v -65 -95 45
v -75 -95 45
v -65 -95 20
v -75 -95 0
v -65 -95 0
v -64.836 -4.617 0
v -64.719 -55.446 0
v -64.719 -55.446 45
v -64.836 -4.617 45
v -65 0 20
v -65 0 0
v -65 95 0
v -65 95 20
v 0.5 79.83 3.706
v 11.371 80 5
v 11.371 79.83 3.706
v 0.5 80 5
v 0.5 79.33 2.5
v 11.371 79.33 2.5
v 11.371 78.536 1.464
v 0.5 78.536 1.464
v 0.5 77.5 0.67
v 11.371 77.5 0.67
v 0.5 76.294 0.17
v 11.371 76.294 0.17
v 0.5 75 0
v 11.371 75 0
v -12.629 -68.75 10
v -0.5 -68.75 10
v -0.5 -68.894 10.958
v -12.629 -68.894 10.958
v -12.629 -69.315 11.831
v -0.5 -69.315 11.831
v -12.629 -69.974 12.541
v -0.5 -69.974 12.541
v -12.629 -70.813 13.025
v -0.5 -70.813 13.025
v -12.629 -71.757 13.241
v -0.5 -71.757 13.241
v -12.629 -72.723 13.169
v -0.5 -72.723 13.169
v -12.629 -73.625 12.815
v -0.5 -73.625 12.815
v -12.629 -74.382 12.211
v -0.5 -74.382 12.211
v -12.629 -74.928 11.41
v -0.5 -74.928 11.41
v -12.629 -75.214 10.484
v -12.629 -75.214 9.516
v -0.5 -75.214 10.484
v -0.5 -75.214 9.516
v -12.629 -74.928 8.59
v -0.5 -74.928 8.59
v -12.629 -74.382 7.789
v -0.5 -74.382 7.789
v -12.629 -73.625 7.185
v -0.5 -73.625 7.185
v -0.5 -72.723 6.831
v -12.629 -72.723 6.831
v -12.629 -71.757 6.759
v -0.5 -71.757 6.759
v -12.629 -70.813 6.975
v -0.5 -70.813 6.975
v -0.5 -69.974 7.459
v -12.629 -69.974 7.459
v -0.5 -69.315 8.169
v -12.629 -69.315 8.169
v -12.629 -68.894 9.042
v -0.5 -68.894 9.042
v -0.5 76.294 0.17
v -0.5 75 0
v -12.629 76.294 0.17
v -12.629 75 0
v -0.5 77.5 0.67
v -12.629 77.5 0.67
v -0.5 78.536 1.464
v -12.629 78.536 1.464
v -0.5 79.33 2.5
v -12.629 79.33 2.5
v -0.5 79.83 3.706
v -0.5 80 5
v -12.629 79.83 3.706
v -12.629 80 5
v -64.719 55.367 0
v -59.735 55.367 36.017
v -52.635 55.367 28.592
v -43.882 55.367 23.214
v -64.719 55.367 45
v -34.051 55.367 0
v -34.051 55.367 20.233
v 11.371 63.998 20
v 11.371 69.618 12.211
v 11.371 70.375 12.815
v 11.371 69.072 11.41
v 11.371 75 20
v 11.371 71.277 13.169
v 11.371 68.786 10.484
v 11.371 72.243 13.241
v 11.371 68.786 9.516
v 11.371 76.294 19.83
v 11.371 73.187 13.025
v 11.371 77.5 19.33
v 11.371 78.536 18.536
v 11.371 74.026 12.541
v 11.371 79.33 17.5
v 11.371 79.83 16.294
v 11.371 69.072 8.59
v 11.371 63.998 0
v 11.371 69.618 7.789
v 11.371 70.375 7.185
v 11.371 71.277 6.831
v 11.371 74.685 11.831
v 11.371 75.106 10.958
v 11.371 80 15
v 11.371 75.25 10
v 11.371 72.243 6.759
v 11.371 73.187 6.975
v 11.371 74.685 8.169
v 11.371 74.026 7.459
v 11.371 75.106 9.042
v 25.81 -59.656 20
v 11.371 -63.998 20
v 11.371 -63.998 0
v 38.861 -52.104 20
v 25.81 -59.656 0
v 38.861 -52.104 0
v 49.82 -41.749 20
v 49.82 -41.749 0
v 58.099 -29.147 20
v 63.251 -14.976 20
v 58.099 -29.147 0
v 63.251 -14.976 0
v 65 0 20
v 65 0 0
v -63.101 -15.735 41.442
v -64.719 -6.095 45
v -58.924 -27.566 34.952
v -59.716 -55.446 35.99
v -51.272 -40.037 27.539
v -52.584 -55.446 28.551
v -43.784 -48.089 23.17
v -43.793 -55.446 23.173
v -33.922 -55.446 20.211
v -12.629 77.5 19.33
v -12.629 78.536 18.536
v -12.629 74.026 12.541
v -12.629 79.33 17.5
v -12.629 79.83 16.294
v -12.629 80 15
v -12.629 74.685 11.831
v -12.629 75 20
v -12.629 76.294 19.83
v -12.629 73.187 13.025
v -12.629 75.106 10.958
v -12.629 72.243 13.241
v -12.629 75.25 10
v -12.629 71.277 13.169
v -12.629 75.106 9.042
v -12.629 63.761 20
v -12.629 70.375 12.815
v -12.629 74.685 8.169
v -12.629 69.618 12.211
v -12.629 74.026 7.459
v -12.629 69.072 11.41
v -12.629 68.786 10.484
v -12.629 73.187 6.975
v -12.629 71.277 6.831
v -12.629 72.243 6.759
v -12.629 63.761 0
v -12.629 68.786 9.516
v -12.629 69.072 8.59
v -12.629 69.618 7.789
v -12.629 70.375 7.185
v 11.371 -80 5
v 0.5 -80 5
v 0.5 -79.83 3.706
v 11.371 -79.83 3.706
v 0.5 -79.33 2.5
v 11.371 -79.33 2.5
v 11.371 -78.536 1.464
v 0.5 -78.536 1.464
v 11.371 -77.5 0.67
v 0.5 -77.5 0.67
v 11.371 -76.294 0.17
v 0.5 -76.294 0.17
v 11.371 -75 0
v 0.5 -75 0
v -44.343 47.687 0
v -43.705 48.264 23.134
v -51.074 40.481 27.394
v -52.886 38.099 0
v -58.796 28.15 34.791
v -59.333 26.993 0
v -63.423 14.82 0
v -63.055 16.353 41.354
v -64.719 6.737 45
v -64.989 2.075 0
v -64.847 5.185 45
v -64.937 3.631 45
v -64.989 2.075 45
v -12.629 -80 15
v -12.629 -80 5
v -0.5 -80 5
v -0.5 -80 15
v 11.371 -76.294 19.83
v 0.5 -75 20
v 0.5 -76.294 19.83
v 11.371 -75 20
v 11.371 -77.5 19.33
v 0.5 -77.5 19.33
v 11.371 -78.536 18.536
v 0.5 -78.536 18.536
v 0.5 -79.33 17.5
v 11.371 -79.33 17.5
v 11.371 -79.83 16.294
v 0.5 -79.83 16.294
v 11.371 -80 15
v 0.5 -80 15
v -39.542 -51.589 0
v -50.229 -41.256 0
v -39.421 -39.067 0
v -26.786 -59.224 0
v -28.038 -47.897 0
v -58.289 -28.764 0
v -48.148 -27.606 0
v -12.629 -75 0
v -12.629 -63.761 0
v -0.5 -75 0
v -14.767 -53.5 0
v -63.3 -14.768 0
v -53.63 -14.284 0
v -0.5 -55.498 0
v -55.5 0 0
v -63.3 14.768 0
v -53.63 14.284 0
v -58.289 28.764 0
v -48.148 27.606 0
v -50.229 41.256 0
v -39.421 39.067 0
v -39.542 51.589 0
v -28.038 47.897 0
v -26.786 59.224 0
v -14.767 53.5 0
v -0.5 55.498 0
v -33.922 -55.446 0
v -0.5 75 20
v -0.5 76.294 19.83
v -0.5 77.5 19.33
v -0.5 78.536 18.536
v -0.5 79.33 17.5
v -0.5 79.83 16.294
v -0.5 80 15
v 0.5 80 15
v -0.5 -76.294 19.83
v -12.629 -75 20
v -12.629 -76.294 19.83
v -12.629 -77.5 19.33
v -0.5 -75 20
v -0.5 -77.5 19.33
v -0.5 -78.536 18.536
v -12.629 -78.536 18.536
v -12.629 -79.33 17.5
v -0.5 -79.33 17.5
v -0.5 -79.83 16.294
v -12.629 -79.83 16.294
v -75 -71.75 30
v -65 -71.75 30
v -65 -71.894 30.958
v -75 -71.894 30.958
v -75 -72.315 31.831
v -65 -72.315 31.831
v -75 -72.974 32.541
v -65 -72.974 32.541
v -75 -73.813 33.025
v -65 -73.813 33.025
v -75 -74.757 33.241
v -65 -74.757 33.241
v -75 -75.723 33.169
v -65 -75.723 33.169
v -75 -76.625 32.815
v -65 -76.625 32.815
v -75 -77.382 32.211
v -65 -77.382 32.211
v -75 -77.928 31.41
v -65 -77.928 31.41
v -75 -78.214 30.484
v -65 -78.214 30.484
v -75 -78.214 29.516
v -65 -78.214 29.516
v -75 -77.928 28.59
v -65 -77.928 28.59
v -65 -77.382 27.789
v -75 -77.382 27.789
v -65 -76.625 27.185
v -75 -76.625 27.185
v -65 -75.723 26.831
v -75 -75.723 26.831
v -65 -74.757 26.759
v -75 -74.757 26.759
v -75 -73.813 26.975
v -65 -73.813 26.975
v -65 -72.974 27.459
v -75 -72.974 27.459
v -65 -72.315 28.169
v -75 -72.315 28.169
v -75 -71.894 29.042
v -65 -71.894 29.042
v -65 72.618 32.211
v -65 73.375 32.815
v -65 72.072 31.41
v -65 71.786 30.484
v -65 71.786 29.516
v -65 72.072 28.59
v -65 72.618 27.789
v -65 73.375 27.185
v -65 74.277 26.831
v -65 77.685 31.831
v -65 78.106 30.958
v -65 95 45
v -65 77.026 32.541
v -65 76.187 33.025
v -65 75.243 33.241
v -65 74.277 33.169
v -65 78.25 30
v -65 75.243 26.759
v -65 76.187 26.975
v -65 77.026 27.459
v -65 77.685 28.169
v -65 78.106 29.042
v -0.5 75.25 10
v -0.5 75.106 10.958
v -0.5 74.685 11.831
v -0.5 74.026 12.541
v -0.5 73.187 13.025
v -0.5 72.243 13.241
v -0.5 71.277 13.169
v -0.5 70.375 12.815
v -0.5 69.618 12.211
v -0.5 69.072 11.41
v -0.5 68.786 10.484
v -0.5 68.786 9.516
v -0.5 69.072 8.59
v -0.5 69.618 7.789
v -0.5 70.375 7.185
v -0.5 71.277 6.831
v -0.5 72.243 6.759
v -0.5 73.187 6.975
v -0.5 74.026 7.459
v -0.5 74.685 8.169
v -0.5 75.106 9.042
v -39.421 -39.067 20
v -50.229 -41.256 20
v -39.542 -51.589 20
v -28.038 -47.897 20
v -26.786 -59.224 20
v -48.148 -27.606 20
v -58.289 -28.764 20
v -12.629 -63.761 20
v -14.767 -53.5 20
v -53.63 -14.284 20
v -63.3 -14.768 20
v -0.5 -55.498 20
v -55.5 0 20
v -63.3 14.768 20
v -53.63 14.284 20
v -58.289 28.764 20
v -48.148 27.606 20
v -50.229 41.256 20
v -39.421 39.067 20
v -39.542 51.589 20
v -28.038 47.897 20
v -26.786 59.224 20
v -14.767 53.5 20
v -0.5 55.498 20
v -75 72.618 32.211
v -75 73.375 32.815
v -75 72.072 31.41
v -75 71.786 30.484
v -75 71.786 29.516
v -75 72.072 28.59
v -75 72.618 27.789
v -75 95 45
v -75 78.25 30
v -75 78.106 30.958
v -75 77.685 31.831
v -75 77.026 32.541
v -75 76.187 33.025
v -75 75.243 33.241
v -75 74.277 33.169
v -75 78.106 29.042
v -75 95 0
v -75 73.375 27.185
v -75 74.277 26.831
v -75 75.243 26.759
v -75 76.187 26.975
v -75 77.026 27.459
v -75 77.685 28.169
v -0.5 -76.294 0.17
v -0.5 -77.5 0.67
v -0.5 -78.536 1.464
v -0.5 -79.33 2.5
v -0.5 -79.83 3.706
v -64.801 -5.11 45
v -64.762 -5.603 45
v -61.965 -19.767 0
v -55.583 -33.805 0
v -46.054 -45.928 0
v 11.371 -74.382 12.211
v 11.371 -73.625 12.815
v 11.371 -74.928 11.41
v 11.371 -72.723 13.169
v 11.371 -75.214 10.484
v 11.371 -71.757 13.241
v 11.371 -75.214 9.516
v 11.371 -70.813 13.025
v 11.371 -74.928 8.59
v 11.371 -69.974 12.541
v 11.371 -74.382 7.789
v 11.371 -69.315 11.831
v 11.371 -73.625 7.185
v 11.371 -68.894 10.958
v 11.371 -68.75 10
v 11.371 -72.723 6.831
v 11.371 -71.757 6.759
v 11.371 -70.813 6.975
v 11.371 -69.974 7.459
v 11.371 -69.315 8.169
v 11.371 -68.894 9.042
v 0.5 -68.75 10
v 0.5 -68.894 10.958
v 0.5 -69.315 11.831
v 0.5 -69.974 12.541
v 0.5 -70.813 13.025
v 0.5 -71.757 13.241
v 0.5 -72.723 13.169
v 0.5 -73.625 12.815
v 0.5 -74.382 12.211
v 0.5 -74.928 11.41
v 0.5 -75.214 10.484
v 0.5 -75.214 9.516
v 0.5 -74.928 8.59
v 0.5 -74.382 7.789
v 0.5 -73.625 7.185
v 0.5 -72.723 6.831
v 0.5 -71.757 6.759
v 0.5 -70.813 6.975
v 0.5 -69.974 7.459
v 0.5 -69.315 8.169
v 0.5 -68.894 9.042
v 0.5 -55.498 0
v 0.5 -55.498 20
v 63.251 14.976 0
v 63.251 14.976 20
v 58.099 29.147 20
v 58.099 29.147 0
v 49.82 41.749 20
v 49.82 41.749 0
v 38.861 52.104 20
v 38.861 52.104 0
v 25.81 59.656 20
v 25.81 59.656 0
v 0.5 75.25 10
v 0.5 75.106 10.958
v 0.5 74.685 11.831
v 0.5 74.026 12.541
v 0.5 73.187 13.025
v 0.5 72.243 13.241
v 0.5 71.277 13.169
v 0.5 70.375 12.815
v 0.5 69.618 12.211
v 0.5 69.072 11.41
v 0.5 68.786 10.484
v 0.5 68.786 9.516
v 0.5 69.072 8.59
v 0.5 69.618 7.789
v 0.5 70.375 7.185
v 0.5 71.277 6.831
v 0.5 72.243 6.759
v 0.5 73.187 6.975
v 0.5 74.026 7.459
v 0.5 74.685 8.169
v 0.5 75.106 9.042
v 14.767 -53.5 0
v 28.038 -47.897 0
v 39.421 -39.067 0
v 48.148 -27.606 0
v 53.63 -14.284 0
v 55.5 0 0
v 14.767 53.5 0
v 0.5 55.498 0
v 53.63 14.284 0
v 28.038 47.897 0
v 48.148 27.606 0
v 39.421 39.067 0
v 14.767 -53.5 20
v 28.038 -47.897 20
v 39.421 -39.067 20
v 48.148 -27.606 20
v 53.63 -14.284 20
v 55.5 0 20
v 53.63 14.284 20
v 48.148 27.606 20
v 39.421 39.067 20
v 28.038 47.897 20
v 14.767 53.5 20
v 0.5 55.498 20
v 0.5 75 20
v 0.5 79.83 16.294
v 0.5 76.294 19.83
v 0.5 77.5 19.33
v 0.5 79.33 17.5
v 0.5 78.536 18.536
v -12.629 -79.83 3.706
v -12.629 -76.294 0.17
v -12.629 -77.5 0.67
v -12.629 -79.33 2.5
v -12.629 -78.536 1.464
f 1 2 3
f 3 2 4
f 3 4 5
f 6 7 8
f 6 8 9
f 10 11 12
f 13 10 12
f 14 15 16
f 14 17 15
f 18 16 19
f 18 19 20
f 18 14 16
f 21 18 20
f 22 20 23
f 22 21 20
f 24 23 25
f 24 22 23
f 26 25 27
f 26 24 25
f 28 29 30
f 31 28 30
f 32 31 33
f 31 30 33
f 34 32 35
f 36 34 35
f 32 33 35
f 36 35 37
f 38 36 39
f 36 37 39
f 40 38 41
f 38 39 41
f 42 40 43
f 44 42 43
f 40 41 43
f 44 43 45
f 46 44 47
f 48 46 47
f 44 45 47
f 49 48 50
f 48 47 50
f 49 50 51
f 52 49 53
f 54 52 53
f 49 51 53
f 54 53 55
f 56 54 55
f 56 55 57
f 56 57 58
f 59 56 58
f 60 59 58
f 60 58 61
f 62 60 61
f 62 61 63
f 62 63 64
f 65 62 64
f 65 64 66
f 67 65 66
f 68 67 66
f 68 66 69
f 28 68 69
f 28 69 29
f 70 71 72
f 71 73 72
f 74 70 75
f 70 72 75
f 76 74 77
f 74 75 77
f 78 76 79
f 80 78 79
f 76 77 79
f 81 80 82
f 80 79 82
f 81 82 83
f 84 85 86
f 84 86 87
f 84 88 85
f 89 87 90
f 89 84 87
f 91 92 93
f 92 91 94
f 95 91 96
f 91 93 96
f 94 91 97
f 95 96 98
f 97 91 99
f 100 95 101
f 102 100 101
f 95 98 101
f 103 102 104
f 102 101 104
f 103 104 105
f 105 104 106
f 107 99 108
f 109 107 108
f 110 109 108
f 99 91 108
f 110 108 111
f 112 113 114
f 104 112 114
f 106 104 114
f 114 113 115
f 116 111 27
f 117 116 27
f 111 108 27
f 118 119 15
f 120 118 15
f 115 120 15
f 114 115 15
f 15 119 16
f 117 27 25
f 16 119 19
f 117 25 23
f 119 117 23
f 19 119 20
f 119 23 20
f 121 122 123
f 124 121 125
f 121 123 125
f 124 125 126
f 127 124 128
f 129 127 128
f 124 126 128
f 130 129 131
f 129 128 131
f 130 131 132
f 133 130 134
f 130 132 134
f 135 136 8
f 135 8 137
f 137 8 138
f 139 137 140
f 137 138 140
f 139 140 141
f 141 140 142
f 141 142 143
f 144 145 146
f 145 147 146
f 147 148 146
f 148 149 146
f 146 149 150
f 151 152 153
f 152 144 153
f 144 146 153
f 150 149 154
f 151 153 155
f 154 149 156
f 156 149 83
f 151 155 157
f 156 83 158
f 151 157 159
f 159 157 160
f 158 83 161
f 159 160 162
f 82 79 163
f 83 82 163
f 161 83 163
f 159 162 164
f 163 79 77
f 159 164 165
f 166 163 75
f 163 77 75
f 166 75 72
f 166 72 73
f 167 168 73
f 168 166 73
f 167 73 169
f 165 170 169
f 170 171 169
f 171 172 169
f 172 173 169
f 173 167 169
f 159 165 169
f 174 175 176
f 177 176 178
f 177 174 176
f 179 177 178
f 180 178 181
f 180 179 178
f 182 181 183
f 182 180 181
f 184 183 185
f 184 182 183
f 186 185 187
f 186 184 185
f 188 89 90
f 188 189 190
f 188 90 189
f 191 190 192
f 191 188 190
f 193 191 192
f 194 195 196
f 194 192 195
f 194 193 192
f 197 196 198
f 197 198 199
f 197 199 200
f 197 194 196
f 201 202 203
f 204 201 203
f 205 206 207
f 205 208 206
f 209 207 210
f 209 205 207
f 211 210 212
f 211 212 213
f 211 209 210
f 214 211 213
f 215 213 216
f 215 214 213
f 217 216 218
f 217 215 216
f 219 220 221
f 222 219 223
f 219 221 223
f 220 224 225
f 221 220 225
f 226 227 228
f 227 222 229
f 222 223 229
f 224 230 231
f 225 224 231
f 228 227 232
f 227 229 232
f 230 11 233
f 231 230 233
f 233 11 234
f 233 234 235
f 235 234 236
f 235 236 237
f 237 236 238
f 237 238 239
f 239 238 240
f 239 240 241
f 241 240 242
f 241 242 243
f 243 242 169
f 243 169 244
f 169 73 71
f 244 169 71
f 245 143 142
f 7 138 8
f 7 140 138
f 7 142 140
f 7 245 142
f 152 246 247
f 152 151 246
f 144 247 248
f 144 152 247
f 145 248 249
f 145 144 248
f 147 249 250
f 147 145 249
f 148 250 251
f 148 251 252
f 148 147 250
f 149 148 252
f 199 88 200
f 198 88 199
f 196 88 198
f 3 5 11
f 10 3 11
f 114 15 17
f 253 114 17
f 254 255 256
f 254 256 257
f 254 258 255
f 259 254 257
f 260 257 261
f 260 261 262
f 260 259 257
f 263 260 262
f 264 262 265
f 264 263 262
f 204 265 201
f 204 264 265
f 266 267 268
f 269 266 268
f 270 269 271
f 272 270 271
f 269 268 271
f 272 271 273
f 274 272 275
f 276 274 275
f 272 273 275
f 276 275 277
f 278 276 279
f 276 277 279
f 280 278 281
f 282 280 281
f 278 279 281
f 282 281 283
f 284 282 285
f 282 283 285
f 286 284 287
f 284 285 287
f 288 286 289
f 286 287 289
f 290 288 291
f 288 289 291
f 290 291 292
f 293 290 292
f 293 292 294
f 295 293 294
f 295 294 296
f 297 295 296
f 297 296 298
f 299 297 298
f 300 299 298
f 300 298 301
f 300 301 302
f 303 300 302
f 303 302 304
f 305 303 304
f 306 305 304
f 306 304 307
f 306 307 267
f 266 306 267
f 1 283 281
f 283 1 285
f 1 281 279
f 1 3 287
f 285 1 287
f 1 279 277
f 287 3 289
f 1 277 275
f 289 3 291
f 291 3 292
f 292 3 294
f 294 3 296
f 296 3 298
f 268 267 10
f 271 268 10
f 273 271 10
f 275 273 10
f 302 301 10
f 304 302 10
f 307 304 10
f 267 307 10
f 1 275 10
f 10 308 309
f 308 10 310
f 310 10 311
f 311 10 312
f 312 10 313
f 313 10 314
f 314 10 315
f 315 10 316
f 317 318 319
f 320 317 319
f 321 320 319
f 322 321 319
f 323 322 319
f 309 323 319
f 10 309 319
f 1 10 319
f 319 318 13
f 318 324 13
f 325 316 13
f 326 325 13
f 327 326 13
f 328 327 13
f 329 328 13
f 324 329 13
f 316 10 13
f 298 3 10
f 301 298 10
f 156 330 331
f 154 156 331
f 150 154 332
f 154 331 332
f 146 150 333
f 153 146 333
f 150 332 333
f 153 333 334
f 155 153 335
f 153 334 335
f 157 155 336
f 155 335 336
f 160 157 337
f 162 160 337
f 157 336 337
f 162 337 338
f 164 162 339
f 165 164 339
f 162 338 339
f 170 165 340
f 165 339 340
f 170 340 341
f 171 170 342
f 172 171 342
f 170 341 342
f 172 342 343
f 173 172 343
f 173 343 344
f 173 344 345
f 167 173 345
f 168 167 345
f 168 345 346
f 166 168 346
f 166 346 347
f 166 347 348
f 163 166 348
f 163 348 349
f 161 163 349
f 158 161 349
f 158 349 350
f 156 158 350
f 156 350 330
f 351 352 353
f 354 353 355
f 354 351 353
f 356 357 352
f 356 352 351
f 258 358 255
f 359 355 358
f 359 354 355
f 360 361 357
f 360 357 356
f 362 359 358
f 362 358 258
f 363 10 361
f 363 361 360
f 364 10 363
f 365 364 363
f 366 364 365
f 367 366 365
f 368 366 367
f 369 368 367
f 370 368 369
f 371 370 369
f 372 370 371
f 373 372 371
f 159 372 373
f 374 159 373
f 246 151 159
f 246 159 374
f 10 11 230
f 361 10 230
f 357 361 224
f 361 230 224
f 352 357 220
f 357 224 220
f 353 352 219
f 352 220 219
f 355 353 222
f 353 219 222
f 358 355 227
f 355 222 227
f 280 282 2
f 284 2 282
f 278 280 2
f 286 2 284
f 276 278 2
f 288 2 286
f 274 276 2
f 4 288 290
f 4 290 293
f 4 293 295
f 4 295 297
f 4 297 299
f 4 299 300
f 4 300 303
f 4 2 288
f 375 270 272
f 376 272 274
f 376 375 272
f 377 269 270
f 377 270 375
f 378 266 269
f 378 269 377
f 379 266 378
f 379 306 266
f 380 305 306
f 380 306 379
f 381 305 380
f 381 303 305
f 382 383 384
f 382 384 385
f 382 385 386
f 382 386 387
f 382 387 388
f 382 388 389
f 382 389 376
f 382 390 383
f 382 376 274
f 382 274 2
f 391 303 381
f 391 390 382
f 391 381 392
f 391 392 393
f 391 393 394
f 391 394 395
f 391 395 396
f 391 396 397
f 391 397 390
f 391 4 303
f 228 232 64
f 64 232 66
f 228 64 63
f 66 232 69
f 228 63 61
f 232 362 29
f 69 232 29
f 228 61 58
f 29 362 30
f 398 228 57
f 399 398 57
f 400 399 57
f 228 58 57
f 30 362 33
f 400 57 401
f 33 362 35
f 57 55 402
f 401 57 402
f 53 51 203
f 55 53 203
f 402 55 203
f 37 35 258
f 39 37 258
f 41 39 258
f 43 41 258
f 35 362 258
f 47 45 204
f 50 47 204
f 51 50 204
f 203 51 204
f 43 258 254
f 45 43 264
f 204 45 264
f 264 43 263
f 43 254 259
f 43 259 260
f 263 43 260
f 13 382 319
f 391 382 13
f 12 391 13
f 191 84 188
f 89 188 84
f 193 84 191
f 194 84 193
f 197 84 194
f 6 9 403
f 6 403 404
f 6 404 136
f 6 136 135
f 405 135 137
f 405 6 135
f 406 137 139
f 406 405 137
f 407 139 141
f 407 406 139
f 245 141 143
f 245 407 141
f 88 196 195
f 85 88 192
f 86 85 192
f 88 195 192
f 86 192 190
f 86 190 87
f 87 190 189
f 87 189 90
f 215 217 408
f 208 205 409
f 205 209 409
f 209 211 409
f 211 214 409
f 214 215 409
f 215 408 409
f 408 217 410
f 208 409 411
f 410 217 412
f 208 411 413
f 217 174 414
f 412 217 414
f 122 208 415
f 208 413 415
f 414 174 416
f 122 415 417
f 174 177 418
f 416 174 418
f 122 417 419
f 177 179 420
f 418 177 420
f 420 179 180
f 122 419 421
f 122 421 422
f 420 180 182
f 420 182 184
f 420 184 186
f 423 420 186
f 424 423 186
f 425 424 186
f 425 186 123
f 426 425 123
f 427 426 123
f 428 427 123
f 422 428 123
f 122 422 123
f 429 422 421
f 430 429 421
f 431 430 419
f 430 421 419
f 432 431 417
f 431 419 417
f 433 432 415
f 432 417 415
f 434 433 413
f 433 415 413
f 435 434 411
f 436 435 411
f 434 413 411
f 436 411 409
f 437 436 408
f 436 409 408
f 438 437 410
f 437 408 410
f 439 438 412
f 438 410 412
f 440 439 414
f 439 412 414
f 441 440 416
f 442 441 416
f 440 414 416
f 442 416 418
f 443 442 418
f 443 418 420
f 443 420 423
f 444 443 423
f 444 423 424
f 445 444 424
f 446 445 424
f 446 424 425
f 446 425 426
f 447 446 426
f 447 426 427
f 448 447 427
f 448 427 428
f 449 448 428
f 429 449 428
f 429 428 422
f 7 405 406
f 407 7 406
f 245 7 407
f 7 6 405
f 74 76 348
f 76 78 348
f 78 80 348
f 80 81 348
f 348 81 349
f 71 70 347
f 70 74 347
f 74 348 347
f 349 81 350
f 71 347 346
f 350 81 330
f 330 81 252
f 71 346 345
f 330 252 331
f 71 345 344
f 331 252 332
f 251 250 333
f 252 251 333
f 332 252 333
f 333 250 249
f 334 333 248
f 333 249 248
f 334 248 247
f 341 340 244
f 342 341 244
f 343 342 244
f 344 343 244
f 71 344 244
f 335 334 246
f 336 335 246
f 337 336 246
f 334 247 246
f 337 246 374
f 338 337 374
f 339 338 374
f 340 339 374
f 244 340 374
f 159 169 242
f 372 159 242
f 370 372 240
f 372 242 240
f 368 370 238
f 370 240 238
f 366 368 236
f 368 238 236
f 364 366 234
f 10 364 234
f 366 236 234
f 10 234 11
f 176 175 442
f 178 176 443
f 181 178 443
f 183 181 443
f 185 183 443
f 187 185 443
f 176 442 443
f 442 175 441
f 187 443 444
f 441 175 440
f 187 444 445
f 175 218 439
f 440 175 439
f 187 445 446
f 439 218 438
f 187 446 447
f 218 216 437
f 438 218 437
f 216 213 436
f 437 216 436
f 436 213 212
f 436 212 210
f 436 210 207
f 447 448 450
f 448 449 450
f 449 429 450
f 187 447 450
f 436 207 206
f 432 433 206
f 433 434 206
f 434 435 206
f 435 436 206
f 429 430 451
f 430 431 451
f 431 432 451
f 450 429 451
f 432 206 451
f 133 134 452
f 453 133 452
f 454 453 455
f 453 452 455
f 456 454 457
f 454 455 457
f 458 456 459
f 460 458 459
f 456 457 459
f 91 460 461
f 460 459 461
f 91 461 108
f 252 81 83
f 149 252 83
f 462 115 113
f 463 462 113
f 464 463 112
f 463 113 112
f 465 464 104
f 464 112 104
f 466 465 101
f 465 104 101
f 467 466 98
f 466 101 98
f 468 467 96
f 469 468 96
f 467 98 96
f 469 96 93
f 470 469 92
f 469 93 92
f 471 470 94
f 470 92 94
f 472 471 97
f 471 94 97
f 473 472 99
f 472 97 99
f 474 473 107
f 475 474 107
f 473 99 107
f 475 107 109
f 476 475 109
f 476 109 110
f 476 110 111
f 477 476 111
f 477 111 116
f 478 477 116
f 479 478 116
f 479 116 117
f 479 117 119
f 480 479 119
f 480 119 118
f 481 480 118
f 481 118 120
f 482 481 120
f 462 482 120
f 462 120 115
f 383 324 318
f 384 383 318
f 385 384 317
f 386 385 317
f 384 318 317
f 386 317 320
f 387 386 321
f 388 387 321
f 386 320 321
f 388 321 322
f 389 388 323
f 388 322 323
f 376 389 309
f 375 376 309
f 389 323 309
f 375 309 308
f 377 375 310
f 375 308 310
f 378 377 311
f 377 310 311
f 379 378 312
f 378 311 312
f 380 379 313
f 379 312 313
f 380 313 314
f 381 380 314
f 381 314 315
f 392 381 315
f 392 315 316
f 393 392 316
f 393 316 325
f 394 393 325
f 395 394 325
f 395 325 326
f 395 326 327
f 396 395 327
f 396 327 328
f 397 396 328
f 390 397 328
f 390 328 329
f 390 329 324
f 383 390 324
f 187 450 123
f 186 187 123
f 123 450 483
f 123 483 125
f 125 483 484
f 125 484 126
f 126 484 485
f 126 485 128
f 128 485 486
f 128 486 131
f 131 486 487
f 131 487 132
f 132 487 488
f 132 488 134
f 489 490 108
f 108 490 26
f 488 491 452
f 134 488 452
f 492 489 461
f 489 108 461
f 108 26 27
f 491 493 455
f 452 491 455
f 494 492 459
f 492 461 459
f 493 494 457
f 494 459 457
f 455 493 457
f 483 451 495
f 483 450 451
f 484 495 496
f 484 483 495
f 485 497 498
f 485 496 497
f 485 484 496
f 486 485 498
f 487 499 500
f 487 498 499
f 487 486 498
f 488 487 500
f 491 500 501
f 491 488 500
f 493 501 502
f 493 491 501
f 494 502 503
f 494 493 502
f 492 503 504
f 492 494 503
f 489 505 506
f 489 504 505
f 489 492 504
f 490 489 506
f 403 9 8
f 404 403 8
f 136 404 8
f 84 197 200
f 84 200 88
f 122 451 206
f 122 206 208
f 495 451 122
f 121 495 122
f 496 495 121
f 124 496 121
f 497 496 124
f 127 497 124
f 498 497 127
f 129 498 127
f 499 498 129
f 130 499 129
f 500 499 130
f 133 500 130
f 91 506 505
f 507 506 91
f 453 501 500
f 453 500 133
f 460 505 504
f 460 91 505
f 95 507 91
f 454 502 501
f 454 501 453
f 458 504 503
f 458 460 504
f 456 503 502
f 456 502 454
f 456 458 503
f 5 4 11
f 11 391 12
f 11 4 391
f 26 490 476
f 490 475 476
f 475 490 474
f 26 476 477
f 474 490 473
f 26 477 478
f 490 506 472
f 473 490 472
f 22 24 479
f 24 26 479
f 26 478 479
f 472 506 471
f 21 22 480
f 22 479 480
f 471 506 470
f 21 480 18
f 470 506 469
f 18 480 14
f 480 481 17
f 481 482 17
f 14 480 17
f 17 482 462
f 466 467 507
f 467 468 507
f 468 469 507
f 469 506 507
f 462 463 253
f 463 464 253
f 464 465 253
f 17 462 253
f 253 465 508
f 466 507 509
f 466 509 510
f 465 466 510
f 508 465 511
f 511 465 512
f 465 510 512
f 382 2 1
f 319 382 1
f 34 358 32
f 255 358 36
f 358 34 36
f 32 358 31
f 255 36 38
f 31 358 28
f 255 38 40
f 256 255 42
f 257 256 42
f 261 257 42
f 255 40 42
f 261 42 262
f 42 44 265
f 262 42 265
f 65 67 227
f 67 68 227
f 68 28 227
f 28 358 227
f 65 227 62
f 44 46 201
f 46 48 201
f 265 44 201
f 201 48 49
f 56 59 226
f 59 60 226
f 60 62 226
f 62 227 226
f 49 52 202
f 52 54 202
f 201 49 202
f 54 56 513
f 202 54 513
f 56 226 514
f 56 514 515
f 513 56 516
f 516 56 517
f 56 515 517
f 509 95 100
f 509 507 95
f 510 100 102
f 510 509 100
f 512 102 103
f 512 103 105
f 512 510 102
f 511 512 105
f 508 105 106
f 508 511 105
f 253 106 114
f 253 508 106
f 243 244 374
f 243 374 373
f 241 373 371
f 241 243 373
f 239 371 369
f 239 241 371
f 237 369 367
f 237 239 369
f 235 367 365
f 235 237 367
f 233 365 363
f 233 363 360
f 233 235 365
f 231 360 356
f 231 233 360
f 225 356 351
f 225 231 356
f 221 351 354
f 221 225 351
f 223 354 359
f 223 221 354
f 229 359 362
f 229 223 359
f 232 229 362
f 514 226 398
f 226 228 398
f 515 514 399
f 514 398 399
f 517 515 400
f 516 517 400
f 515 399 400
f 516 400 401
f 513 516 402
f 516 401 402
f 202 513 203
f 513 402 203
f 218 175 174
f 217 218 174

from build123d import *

# Parameters (mm, degrees)
F1_DEPTH  = 20
F0_R      = 55.5
F2_R      = 3.25
F3_DEPTH  = 24
F4_W      = 10
F4_H      = 190
F5_DEPTH  = 25
F7_DEPTH  = 45
F9_DEPTH  = 150
F10_R     = 3.25
F11_DEPTH = 25
F13_DEPTH = 25
F14_R     = 5


with BuildPart() as f1:
    # F0 (on Top) → F1 (new body)
    with BuildSketch(Plane.XY):
        Polygon((-65, -95), (-65, -6.1e-09), (-65, 95), (-75, 95), (-75, -95), align=None)
    extrude(amount=F1_DEPTH)



with BuildPart() as f1b:
    # F0 (on Top) → F1, piece 2 (new body)
    with BuildSketch(Plane.XY):
        with BuildLine():
            ThreePointArc((11.3706691191, -63.9977178014), (49.8201439818, -41.7486916397), (65, 0))
            ThreePointArc((65, 0), (49.8201439818, 41.7486916397), (11.3706691191, 63.9977178014))
            ThreePointArc((11.3706691191, 63.9977178014), (-0.6403388413, 64.9968458171), (-12.6293308809, 63.7612735248))
            ThreePointArc((-12.6293308809, 63.7612735248), (-50.2290080912, 41.255869233), (-65, -6.1e-09))
            ThreePointArc((-65, -6.1e-09), (-50.2290080873, -41.2558692378), (-12.6293308809, -63.7612735248))
            ThreePointArc((-12.6293308809, -63.7612735248), (-0.6403388413, -64.9968458171), (11.3706691191, -63.9977178014))
        make_face()
        Circle(F0_R, mode=Mode.SUBTRACT)
        with BuildLine():
            ThreePointArc((-12.6293308809, 63.7612735248), (-0.6403388413, 64.9968458171), (11.3706691191, 63.9977178014))
            Line((11.3706691191, 63.9977178014), (11.3706691191, 80))
            Line((11.3706691191, 80), (-12.6293308809, 80))
            Line((-12.6293308809, 80), (-12.6293308809, 63.7612735248))
        make_face()
        with BuildLine():
            Line((11.3706691191, -80), (11.3706691191, -63.9977178014))
            ThreePointArc((11.3706691191, -63.9977178014), (-0.6403388413, -64.9968458171), (-12.6293308809, -63.7612735248))
            Line((-12.6293308809, -63.7612735248), (-12.6293308809, -80))
            Line((-12.6293308809, -80), (11.3706691191, -80))
        make_face()
    extrude(amount=F1_DEPTH)

    # F2 (on face) → F3 (cut, through all)
    with BuildSketch(Plane.YZ.offset(11.3706691191)):
        with Locations((-72, 10)):
            Circle(F2_R)
        with Locations((72, 10)):
            Circle(F2_R)
    extrude(amount=-F3_DEPTH, mode=Mode.SUBTRACT)


with BuildPart() as f1_1:
    add(f1.part)

    add(f1b.part)  # F5 merges F1b
    # F4 (on face) → F5 (join)
    with BuildSketch(Plane.XY.offset(20)):
        with Locations((-70, 0)):
            Rectangle(F4_W, F4_H)
    extrude(amount=F5_DEPTH)

    # F10 (on face) → F11 (cut)
    with BuildSketch(Plane.YZ.offset(-65)):
        with Locations((-75, 30)):
            Circle(F10_R)
        with Locations((75, 30)):
            Circle(F10_R)
    extrude(amount=-F11_DEPTH, mode=Mode.SUBTRACT)

    # F12 (on face) → F13 (cut)
    with BuildSketch(Plane.XY.offset(20)):
        with BuildLine():
            Line((0.5, 80), (-0.5, 80))
            Line((-0.5, 80), (-0.5, 55.497747702))
            ThreePointArc((-0.5, 55.497747702), (0, 55.5), (0.5, 55.497747702))
            Line((0.5, 55.497747702), (0.5, 80))
        make_face()
        with BuildLine():
            ThreePointArc((0.5, -55.497747702), (0, -55.5), (-0.5, -55.497747702))
            Line((-0.5, -55.497747702), (-0.5, -80))
            Line((-0.5, -80), (0.5, -80))
            Line((0.5, -80), (0.5, -55.497747702))
        make_face()
    extrude(amount=-F13_DEPTH, mode=Mode.SUBTRACT)

    # F14
    f14_edges = [f1_1.edges().sort_by_distance(p)[0] for p in [
        (-6.564665, -80, 0),
        (5.935335, -80, 0),
        (5.935335, -80, 20),
        (-6.564665, -80, 20),
        (-6.564665, 80, 0),
        (5.935335, 80, 0),
        (-6.564665, 80, 20),
        (5.935335, 80, 20),
    ]]
    fillet(f14_edges, radius=F14_R)


with BuildPart() as f7:
    # F6 (on face) → F7 (new body)
    with BuildSketch(Plane(origin=(0, 0, 0), x_dir=(1, 0, 0), z_dir=(0, 0, -1))):
        with BuildLine():
            ThreePointArc((-64.8358060031, 4.6171701211), (-55.5829947499, 33.8047913994), (-33.9223448814, 55.446140693))
            Line((-33.9223448814, 55.446140693), (-64.7187477277, 55.446140693))
            Line((-64.7187477277, 55.446140693), (-64.8358060031, 4.6171701211))
        make_face()
    extrude(amount=-F7_DEPTH)


with BuildPart() as f7b:
    # F6 (on face) → F7, piece 2 (new body)
    with BuildSketch(Plane(origin=(0, 0, 0), x_dir=(1, 0, 0), z_dir=(0, 0, -1))):
        with BuildLine():
            ThreePointArc((-34.0510388969, -55.3671992252), (-56.3898963773, -32.7090686221), (-64.9894624502, -2.0747267928))
            Line((-64.9894624502, -2.0747267928), (-64.7187896644, -55.3671992252))
            Line((-64.7187896644, -55.3671992252), (-34.0510388969, -55.3671992252))
        make_face()
    extrude(amount=-F7_DEPTH)


with BuildPart() as f9_tool:
    # F8 (on face) → F9 (new body)
    with BuildSketch(Plane.XZ.offset(55.446140693)):
        with BuildLine():
            Line((-33.9223448814, 45), (-64.7187477277, 45))
            ThreePointArc((-64.7187477277, 45), (-52.5839000645, 28.5513566739), (-33.9223448814, 20.2111676335))
            Line((-33.9223448814, 20.2111676335), (-33.9223448814, 45))
        make_face()
    extrude(amount=-F9_DEPTH)


with BuildPart() as f7_1:
    add(f7.part)

    # F9: cut by f9_tool
    add(f9_tool.part, mode=Mode.SUBTRACT)


with BuildPart() as f7b_1:
    add(f7b.part)

    # F9: cut by f9_tool
    add(f9_tool.part, mode=Mode.SUBTRACT)


solid = Compound([f1_1.part, f7_1.part, f7b_1.part])
